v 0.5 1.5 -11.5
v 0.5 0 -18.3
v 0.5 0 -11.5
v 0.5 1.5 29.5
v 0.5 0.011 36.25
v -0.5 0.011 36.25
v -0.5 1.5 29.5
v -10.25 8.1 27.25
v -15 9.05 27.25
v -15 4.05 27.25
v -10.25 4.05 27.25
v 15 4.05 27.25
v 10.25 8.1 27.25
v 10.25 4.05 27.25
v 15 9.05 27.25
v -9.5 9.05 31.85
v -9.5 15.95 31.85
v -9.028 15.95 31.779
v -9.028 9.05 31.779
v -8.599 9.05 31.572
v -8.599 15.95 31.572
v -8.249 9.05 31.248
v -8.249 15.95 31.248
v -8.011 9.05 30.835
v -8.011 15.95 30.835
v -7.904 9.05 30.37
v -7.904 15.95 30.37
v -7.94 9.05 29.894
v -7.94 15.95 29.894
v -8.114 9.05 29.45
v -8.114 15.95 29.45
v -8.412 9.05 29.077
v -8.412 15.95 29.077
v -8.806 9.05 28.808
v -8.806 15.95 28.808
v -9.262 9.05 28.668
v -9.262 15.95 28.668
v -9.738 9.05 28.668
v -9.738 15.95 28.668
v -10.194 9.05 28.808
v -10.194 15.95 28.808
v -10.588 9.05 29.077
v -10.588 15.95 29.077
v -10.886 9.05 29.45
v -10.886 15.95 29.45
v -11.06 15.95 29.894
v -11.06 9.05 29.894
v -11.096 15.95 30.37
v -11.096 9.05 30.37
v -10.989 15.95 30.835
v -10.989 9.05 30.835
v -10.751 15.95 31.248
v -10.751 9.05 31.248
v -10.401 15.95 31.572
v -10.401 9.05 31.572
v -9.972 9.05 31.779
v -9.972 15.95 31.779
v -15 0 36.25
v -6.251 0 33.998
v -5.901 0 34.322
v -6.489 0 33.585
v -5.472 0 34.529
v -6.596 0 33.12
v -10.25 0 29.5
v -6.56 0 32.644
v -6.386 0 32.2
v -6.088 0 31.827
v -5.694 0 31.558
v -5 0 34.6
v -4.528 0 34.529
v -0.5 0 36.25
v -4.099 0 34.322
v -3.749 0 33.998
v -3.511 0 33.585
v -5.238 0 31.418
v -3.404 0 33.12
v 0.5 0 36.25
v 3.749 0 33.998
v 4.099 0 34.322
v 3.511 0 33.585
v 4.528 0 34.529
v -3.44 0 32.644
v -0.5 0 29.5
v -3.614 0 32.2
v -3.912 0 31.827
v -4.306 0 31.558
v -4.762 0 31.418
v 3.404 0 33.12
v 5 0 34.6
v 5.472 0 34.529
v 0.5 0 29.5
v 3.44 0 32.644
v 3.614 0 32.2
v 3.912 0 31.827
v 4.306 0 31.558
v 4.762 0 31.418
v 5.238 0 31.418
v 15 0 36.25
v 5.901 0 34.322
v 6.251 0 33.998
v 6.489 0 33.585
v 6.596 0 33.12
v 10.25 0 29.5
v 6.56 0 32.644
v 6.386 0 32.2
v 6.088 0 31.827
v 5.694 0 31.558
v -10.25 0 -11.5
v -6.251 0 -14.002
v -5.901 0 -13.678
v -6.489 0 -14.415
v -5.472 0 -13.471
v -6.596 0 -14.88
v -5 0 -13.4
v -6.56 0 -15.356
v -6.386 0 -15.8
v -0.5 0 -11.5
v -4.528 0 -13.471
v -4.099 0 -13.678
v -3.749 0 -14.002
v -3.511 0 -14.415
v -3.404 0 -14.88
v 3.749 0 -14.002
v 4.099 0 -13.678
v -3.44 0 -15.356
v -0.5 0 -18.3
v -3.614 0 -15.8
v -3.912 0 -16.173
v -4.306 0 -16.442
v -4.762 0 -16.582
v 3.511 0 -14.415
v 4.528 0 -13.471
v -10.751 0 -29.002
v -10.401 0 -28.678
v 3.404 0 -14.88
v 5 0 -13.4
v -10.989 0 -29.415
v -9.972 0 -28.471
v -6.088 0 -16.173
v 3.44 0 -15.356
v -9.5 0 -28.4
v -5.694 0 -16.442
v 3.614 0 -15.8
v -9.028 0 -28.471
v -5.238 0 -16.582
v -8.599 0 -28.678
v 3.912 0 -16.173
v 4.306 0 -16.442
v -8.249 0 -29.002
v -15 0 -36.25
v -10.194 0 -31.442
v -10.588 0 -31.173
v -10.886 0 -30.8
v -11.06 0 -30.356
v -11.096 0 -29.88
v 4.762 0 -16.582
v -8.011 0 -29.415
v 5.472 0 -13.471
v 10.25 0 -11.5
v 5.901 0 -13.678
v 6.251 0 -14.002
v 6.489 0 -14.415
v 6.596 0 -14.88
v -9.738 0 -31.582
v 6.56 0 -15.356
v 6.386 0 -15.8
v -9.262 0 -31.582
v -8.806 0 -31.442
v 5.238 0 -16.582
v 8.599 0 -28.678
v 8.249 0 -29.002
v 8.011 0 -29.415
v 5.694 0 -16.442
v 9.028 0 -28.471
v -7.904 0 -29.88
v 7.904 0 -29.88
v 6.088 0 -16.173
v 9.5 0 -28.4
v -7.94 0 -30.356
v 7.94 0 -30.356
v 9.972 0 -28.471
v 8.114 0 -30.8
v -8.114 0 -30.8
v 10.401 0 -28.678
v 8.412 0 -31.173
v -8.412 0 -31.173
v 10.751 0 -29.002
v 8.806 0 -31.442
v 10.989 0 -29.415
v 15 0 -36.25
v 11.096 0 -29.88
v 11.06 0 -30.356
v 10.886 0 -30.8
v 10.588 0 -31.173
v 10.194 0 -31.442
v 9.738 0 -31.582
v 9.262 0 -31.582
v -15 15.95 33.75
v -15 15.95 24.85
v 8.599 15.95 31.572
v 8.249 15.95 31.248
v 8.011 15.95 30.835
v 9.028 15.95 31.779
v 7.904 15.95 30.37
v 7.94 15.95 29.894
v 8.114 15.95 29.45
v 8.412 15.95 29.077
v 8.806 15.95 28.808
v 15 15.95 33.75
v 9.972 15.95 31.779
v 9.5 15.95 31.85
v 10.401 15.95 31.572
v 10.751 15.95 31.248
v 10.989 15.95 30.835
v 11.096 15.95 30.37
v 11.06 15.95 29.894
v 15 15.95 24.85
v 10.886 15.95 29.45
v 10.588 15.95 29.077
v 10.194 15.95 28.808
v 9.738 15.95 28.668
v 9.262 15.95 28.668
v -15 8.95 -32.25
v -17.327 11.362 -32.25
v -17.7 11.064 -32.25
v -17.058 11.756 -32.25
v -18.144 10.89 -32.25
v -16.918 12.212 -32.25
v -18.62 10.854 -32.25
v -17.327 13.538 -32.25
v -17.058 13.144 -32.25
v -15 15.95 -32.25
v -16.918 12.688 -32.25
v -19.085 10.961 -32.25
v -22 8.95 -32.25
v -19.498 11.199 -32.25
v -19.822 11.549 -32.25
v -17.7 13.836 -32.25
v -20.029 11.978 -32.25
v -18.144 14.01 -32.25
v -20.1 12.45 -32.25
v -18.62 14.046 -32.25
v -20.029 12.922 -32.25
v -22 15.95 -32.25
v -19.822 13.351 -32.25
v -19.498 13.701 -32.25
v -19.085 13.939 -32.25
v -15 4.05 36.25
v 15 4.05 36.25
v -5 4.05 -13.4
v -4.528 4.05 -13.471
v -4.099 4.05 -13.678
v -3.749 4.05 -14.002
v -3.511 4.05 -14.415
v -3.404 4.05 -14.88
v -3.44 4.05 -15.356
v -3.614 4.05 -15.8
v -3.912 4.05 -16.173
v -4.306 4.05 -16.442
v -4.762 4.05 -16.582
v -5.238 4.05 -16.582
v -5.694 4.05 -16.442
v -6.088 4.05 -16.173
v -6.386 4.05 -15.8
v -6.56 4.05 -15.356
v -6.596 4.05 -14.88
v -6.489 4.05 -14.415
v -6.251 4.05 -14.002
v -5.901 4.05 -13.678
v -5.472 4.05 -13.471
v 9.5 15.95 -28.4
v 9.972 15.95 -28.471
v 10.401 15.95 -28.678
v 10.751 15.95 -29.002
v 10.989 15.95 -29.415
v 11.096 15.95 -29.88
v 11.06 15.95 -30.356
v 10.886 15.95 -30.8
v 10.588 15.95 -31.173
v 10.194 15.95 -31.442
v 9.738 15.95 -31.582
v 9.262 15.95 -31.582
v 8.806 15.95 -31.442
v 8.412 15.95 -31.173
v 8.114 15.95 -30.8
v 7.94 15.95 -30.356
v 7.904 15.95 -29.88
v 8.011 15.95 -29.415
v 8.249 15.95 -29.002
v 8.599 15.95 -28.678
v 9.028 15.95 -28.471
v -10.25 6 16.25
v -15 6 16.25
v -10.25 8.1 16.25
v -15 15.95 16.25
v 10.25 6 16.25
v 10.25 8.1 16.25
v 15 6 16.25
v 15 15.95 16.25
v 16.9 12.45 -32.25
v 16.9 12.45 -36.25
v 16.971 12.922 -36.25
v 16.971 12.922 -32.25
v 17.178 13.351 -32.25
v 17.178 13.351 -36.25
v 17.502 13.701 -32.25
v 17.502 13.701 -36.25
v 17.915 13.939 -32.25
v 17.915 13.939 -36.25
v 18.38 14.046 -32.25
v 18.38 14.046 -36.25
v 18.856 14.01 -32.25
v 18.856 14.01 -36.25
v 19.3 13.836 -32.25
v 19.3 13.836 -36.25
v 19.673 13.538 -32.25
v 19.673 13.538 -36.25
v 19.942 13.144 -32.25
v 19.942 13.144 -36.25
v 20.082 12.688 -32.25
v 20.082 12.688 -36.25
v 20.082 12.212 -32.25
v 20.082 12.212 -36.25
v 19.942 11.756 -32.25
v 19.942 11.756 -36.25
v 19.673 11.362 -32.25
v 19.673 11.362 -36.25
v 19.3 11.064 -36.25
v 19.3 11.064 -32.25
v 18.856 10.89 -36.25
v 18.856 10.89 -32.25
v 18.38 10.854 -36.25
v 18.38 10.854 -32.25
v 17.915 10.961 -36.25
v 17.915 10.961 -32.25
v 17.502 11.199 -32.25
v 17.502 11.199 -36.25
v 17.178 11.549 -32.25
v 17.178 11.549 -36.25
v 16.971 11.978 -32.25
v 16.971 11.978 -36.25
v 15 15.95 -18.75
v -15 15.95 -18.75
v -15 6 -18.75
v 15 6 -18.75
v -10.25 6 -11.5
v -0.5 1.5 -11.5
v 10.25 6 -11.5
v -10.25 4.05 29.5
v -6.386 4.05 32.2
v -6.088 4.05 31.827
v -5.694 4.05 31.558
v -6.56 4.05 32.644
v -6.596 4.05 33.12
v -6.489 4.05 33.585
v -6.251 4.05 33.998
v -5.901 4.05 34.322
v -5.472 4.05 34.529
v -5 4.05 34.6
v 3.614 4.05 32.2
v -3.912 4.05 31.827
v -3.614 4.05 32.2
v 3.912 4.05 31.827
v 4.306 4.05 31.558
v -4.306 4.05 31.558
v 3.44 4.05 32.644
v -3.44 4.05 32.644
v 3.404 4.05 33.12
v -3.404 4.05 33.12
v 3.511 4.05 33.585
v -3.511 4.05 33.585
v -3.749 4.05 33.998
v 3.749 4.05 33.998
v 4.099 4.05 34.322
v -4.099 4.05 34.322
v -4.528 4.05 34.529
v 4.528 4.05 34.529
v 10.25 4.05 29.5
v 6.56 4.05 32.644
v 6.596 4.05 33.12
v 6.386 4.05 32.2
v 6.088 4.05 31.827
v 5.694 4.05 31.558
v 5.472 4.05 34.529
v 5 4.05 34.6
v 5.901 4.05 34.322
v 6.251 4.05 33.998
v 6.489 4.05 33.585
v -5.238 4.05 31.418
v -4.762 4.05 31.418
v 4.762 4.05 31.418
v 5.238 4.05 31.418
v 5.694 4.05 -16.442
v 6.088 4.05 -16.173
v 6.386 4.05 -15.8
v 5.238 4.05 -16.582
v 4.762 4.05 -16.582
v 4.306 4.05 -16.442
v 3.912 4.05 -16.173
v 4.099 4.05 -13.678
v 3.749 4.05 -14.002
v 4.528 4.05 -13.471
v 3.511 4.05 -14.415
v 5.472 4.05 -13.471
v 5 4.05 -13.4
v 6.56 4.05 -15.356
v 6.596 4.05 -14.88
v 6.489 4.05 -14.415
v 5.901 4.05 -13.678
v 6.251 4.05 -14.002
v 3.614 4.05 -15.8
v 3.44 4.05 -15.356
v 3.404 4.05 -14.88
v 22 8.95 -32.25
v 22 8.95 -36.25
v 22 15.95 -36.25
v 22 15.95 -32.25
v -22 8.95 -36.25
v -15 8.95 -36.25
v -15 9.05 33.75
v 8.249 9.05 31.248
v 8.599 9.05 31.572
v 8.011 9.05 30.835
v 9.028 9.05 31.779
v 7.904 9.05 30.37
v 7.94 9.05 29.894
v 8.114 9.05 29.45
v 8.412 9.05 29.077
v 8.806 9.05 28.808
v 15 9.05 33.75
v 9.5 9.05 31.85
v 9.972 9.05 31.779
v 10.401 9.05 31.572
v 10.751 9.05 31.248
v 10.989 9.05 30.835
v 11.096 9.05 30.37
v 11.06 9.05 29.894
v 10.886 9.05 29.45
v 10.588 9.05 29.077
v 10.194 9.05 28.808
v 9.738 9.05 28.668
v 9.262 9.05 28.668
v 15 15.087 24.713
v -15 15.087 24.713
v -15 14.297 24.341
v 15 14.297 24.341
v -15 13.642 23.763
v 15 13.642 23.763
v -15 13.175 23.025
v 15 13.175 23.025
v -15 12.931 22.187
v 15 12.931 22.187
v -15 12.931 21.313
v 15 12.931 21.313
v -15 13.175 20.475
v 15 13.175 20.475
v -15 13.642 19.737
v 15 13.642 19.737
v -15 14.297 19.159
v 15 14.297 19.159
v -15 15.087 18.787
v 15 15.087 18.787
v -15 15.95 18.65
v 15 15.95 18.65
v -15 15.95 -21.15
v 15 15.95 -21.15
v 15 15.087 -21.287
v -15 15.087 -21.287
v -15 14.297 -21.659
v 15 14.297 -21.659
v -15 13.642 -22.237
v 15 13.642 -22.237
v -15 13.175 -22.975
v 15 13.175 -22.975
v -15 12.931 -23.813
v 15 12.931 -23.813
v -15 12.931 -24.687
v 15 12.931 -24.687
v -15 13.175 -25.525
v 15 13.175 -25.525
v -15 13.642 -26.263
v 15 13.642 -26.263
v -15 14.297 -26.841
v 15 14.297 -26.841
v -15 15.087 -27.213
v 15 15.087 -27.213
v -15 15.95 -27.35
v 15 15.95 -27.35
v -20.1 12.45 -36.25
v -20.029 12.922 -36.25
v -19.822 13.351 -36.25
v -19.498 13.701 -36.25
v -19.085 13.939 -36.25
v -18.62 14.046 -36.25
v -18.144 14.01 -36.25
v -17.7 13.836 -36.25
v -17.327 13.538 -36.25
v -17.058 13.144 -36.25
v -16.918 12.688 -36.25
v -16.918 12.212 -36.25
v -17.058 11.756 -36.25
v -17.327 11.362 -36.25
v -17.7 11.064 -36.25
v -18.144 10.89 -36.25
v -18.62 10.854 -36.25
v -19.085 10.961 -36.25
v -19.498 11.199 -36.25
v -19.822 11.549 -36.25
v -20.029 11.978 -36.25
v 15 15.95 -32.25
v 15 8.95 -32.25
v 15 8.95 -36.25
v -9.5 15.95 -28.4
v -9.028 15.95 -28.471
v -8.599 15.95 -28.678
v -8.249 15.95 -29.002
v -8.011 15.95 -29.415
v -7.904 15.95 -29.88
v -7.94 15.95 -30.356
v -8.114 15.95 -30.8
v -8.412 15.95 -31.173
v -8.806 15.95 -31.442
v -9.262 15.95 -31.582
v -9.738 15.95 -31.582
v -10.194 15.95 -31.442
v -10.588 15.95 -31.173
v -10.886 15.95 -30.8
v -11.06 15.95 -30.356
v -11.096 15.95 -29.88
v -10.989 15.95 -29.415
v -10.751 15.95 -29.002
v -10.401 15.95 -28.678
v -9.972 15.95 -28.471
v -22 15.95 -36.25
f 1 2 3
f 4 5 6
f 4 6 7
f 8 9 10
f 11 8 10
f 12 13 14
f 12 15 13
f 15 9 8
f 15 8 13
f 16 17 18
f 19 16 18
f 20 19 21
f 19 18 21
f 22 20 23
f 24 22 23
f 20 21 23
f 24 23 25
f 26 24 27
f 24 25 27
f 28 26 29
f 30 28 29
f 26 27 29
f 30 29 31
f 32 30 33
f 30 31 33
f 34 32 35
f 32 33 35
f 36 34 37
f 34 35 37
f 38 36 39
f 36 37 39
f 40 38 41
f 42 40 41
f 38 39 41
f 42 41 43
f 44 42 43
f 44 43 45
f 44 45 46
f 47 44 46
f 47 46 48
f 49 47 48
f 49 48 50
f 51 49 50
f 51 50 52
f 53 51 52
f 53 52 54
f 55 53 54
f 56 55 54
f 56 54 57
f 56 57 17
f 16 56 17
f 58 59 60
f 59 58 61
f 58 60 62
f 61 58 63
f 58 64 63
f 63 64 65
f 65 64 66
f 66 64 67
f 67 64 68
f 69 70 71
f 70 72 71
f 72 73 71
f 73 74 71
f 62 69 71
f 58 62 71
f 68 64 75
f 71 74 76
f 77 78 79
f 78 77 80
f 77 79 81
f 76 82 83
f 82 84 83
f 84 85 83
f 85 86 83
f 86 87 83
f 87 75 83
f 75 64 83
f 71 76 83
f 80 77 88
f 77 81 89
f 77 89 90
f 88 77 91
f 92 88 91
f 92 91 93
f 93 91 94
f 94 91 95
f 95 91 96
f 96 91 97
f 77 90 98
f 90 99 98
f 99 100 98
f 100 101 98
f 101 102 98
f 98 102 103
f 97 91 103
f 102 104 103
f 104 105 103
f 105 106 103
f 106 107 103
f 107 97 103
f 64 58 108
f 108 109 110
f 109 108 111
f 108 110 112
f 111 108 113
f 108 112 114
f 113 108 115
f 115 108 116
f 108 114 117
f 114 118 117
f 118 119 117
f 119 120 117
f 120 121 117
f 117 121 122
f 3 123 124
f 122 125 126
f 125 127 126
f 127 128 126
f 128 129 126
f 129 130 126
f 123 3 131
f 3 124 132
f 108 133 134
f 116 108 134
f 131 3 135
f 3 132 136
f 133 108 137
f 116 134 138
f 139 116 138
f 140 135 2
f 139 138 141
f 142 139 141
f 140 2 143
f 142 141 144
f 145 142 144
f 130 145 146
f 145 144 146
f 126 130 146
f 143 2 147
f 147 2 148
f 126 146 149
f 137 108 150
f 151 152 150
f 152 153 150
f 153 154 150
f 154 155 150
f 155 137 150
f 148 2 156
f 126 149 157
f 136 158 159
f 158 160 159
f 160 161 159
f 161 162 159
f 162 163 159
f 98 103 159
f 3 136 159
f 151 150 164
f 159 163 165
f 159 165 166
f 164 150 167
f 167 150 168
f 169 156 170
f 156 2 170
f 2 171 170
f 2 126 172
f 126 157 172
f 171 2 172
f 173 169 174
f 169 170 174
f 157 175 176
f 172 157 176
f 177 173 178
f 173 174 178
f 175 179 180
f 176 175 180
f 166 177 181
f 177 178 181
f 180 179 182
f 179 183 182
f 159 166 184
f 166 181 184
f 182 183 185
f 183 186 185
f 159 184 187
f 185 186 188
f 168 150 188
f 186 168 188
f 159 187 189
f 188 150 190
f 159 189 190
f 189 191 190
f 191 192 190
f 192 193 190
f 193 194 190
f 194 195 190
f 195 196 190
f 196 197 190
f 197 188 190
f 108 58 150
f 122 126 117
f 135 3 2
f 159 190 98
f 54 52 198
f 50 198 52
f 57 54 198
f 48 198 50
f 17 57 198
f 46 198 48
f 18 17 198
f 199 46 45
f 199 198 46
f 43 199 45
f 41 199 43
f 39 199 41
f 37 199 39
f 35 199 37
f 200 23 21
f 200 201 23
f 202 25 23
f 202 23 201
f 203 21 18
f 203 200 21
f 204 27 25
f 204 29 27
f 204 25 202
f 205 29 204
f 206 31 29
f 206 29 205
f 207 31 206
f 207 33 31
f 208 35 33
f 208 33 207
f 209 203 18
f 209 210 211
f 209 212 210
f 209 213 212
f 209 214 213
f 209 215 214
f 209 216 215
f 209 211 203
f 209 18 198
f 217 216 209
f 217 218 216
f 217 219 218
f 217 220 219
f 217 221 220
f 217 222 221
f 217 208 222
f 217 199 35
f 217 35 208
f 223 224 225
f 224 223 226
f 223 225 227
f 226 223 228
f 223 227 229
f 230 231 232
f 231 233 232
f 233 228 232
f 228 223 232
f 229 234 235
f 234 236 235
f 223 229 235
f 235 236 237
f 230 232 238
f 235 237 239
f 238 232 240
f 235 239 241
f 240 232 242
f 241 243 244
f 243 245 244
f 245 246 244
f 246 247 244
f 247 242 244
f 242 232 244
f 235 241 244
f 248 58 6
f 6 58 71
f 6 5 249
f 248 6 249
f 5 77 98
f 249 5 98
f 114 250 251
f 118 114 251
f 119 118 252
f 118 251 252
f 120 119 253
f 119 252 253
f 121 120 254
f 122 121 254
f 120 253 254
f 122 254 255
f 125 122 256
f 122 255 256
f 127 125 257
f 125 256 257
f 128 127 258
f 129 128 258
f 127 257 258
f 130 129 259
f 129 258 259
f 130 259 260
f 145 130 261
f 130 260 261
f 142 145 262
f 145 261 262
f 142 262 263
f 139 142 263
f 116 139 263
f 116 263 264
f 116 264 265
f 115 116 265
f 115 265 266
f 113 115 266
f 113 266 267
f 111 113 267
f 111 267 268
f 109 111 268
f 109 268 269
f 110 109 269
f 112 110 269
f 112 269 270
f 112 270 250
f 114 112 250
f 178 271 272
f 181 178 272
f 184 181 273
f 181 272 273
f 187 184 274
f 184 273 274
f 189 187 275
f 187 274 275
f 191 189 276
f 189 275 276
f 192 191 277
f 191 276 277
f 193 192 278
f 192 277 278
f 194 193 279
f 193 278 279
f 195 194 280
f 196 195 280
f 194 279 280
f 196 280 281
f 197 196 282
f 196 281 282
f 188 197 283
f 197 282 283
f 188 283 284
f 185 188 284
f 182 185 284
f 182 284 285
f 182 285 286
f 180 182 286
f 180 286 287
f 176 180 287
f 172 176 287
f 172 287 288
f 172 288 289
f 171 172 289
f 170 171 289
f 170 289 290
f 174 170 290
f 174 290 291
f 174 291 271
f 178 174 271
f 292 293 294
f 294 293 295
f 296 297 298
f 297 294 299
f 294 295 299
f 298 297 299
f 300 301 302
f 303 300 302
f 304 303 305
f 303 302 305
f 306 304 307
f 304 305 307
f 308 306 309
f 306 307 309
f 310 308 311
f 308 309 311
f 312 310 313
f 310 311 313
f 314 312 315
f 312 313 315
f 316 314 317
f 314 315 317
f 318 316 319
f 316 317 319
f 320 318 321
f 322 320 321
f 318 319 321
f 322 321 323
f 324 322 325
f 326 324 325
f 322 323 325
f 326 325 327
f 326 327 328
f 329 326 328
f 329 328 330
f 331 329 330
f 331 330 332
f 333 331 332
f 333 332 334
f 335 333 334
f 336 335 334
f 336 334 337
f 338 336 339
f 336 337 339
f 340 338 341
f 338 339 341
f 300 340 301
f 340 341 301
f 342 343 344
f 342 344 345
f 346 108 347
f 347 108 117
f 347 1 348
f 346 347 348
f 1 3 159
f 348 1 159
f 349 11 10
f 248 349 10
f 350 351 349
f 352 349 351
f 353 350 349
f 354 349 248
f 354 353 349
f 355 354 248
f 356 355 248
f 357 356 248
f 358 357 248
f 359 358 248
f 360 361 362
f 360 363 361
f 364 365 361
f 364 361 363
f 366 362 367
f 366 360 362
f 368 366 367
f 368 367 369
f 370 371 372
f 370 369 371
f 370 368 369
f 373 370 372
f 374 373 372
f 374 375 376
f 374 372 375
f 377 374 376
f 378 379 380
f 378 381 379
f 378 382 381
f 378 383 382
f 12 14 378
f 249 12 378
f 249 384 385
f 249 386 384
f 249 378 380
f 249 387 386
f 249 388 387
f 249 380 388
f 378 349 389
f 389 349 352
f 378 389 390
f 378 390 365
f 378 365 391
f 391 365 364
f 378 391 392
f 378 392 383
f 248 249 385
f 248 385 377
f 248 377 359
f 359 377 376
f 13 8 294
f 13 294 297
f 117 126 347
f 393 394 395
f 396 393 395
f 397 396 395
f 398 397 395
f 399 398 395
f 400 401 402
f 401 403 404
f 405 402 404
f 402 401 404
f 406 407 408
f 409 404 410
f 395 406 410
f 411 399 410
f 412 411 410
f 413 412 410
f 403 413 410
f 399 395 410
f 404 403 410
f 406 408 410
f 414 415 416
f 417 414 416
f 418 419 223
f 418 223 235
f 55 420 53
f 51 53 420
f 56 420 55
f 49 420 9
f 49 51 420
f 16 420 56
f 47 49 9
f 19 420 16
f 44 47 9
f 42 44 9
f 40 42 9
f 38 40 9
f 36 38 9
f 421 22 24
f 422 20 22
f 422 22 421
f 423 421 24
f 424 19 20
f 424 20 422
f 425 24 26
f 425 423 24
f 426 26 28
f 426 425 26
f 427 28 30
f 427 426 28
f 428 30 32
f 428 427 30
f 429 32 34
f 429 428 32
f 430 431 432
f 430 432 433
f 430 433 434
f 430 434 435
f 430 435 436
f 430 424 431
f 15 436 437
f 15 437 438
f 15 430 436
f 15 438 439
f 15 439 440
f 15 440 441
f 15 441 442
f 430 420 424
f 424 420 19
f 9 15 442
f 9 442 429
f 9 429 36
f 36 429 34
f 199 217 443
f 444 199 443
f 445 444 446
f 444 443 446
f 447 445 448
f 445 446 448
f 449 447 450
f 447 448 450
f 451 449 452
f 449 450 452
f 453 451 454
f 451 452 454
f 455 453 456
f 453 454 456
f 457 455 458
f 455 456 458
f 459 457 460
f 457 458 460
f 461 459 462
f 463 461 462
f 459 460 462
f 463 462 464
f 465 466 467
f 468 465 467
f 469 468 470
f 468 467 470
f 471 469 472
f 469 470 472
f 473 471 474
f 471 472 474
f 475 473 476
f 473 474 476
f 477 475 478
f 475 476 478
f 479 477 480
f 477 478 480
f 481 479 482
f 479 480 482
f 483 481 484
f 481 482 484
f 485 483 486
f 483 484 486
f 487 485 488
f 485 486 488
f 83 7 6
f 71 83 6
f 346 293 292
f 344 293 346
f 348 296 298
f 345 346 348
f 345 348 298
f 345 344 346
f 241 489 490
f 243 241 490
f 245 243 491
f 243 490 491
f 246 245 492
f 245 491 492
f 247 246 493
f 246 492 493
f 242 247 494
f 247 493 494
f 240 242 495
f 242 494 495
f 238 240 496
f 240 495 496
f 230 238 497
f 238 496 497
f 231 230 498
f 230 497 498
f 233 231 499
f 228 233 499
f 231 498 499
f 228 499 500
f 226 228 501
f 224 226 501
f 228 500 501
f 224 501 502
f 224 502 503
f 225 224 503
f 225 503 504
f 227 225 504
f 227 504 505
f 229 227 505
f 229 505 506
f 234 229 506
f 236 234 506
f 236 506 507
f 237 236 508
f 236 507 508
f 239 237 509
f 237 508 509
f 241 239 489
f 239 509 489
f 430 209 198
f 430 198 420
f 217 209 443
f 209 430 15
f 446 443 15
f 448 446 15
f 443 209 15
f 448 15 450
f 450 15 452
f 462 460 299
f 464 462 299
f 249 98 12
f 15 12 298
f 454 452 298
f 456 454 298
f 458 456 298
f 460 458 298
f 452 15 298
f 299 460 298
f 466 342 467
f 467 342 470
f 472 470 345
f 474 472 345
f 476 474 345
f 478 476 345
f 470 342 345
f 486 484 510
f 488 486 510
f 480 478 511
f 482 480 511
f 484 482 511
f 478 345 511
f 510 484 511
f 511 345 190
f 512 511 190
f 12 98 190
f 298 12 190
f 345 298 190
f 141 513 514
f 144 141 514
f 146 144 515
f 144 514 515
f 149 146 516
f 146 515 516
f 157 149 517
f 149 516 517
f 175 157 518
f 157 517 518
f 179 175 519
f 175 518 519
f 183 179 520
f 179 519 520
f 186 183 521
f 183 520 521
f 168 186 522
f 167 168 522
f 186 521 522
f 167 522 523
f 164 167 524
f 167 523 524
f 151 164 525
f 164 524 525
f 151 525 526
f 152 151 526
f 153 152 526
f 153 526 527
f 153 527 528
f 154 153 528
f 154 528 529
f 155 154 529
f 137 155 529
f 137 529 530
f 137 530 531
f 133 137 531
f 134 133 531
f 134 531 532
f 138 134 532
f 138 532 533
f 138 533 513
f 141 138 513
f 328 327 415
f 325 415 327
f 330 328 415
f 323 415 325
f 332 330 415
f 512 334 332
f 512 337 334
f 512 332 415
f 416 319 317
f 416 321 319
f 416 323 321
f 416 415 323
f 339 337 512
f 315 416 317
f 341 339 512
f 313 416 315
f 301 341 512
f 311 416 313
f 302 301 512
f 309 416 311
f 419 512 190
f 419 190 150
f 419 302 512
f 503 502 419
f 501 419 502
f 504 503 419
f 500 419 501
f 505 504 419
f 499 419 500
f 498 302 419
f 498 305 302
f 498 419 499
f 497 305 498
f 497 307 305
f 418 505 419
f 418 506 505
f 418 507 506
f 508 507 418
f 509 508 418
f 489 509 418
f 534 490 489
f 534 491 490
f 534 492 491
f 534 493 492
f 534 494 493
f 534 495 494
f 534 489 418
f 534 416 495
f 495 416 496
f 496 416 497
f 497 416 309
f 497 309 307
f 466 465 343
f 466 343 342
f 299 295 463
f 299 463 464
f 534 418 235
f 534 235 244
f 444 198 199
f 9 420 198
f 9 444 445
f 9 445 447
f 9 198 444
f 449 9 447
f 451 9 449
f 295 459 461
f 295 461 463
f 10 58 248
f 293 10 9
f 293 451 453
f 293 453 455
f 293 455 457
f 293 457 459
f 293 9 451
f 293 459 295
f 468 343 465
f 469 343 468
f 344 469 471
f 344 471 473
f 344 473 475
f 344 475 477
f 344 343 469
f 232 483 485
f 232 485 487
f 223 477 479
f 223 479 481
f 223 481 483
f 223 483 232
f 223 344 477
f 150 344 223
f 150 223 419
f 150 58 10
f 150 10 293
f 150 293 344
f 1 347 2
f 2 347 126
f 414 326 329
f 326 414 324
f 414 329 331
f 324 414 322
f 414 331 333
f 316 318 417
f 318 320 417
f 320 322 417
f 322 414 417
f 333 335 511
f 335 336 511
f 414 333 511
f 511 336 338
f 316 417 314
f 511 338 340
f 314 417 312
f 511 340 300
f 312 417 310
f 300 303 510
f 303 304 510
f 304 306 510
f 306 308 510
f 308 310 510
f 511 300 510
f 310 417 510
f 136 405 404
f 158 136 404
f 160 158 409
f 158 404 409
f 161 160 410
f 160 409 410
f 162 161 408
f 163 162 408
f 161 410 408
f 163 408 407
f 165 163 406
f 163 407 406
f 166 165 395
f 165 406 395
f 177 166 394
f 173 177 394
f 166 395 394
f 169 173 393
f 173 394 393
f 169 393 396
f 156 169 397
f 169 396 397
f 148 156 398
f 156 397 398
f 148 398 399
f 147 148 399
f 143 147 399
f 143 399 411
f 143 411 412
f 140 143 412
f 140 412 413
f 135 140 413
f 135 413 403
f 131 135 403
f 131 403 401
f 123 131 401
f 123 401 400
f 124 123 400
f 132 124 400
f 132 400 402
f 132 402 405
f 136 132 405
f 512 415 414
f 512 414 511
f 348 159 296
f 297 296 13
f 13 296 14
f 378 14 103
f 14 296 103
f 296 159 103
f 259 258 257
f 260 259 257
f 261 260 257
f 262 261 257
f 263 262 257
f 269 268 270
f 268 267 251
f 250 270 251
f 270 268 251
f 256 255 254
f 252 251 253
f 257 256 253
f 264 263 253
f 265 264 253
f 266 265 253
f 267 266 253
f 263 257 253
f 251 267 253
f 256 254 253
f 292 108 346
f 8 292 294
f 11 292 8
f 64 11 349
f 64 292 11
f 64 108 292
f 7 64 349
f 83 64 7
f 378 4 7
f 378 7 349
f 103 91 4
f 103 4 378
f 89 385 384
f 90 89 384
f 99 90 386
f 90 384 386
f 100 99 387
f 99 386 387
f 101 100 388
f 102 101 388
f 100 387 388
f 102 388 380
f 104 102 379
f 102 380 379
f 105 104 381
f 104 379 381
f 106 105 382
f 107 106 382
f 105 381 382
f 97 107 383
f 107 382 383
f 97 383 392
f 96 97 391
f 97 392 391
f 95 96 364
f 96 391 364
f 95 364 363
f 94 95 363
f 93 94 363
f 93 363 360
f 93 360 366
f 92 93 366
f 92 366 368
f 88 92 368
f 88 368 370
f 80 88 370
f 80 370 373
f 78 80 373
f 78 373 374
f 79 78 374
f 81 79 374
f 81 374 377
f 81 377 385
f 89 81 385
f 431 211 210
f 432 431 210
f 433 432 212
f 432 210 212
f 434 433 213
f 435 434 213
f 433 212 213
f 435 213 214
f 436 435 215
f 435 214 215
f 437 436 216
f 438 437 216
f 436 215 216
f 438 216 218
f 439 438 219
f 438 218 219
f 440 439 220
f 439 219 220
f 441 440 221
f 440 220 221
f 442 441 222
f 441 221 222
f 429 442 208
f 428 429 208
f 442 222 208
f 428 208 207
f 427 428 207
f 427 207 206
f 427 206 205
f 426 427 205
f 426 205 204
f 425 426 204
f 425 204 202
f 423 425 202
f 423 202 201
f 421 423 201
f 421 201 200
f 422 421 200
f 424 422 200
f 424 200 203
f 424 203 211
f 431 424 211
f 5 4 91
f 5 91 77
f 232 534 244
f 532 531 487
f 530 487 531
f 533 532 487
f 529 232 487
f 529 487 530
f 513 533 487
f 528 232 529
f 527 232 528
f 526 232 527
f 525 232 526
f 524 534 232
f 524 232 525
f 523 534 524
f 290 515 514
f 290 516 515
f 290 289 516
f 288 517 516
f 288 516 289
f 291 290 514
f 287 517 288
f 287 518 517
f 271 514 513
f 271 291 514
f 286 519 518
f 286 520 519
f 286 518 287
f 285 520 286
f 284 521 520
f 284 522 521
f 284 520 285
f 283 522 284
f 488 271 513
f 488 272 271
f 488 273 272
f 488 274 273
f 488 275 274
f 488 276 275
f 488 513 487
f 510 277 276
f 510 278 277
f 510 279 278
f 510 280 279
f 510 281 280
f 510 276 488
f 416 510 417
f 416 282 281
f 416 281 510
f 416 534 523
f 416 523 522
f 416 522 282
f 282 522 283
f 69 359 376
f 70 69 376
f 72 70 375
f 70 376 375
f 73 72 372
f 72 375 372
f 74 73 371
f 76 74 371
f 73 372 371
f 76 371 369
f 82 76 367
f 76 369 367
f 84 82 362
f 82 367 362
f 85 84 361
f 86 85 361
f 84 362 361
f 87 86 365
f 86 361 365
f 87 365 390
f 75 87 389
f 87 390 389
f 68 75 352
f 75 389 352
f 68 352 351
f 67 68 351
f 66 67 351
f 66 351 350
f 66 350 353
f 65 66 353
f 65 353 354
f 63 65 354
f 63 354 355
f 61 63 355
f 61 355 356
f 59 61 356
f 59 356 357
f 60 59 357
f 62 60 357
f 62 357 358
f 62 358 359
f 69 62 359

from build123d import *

# Parameters (mm, degrees)
SKETCH3_W           = 30
SKETCH3_H           = 72.5
BOSS_EXTRUDE2_DEPTH = 15.95
SKETCH7_W           = 20.5
SKETCH7_H           = 41
CUT_EXTRUDE5_DEPTH  = 8.1
SKETCH8_W           = 30
SKETCH8_H           = 35
CUT_EXTRUDE6_DEPTH  = 9.95
CUT_EXTRUDE7_DEPTH  = 50.683649222
SKETCH10_R          = 3.1
CUT_EXTRUDE8_DEPTH  = 50.683649222
CUT_EXTRUDE9_REACH  = 44.349
SKETCH11_R          = 1.6
CUT_EXTRUDE10_REACH = 42.996
SKETCH12_R          = 1.6
SKETCH13_W          = 7
SKETCH13_H          = 7
SKETCH13_R          = 1.6
BOSS_EXTRUDE3_DEPTH = 4
CUT_EXTRUDE11_DEPTH = 0.5


with BuildPart() as part:
    # Sketch3 → Boss-Extrude2 (new body)
    with BuildSketch(Plane(origin=(0, 0, 0), x_dir=(1, 0, 0), z_dir=(0, 1, 0))):
        Rectangle(SKETCH3_W, SKETCH3_H)
    extrude(amount=BOSS_EXTRUDE2_DEPTH)

    # Sketch7 → Cut-Extrude5 (cut)
    with BuildSketch(Plane.XZ):
        with Locations((0, 9)):
            Rectangle(SKETCH7_W, SKETCH7_H)
    extrude(amount=-CUT_EXTRUDE5_DEPTH, mode=Mode.SUBTRACT)

    # Sketch8 → Cut-Extrude6 (cut)
    with BuildSketch(Plane(origin=(0, 15.95, 0), x_dir=(1, 0, 0), z_dir=(0, 1, 0))):
        with Locations((0, 1.25)):
            Rectangle(SKETCH8_W, SKETCH8_H)
    extrude(amount=-CUT_EXTRUDE6_DEPTH, mode=Mode.SUBTRACT)

    # Sketch9 → Cut-Extrude7 (cut, through all)
    with BuildSketch(Plane(origin=(15, 0, 0), x_dir=(0, 0, -1), z_dir=(1, 0, 0))):
        Polygon((-36.25, 15.95), (-33.75, 15.95), (-33.75, 9.05), (-27.25, 9.05), (-27.25, 4.05), (-36.25, 4.05), align=None)
    extrude(amount=-CUT_EXTRUDE7_DEPTH, mode=Mode.SUBTRACT)

    # Sketch10 → Cut-Extrude8 (cut, through all)
    with BuildSketch(Plane(origin=(15, 0, 0), x_dir=(0, 0, -1), z_dir=(1, 0, 0))):
        with Locations((24.25, 16)):
            Circle(SKETCH10_R)
        with Locations((-21.75, 16)):
            Circle(SKETCH10_R)
    extrude(amount=-CUT_EXTRUDE8_DEPTH, mode=Mode.SUBTRACT)

    # Sketch11 → Cut-Extrude9 (cut, up to next)
    with BuildSketch(Plane(origin=(0, 15.95, 0), x_dir=(1, 0, 0), z_dir=(0, 1, 0)), mode=Mode.PRIVATE) as cut_extrude9_sk1:
        with Locations(Location((-9.5, -30.25, 0), (0, 0, 270))):
            Circle(SKETCH11_R)
    cut_extrude9_tool1 = extrude(cut_extrude9_sk1.sketch, amount=-CUT_EXTRUDE9_REACH, mode=Mode.PRIVATE) & part.part
    # Sketch11 → Cut-Extrude9 (cut, up to next)
    with BuildSketch(Plane(origin=(0, 15.95, 0), x_dir=(1, 0, 0), z_dir=(0, 1, 0)), mode=Mode.PRIVATE) as cut_extrude9_sk2:
        with Locations(Location((9.5, -30.25, 0), (0, 0, 270))):
            Circle(SKETCH11_R)
    cut_extrude9_tool2 = extrude(cut_extrude9_sk2.sketch, amount=-CUT_EXTRUDE9_REACH, mode=Mode.PRIVATE) & part.part
    # Sketch11 → Cut-Extrude9 (cut, up to next)
    with BuildSketch(Plane(origin=(0, 15.95, 0), x_dir=(1, 0, 0), z_dir=(0, 1, 0)), mode=Mode.PRIVATE) as cut_extrude9_sk3:
        with Locations(Location((-9.5, 30, 0), (0, 0, 270))):
            Circle(SKETCH11_R)
    cut_extrude9_tool3 = extrude(cut_extrude9_sk3.sketch, amount=-CUT_EXTRUDE9_REACH, mode=Mode.PRIVATE) & part.part
    # Sketch11 → Cut-Extrude9 (cut, up to next)
    with BuildSketch(Plane(origin=(0, 15.95, 0), x_dir=(1, 0, 0), z_dir=(0, 1, 0)), mode=Mode.PRIVATE) as cut_extrude9_sk4:
        with Locations(Location((9.5, 30, 0), (0, 0, 270))):
            Circle(SKETCH11_R)
    cut_extrude9_tool4 = extrude(cut_extrude9_sk4.sketch, amount=-CUT_EXTRUDE9_REACH, mode=Mode.PRIVATE) & part.part
    add(cut_extrude9_tool1.solids().sort_by_distance((-9.5, 15.95, 30.25))[0], mode=Mode.SUBTRACT)
    add(cut_extrude9_tool2.solids().sort_by_distance((9.5, 15.95, 30.25))[0], mode=Mode.SUBTRACT)
    add(cut_extrude9_tool3.solids().sort_by_distance((-9.5, 15.95, -30))[0], mode=Mode.SUBTRACT)
    add(cut_extrude9_tool4.solids().sort_by_distance((9.5, 15.95, -30))[0], mode=Mode.SUBTRACT)

    # Sketch12 → Cut-Extrude10 (cut, up to next)
    with BuildSketch(Plane(origin=(0, 4.05, 0), x_dir=(1, 0, 0), z_dir=(0, 1, 0)), mode=Mode.PRIVATE) as cut_extrude10_sk1:
        with Locations(Location((-5, -33, 0), (0, 0, 270))):
            Circle(SKETCH12_R)
    cut_extrude10_tool1 = extrude(cut_extrude10_sk1.sketch, amount=-CUT_EXTRUDE10_REACH, mode=Mode.PRIVATE) & part.part
    # Sketch12 → Cut-Extrude10 (cut, up to next)
    with BuildSketch(Plane(origin=(0, 4.05, 0), x_dir=(1, 0, 0), z_dir=(0, 1, 0)), mode=Mode.PRIVATE) as cut_extrude10_sk2:
        with Locations(Location((5, -33, 0), (0, 0, 270))):
            Circle(SKETCH12_R)
    cut_extrude10_tool2 = extrude(cut_extrude10_sk2.sketch, amount=-CUT_EXTRUDE10_REACH, mode=Mode.PRIVATE) & part.part
    # Sketch12 → Cut-Extrude10 (cut, up to next)
    with BuildSketch(Plane(origin=(0, 4.05, 0), x_dir=(1, 0, 0), z_dir=(0, 1, 0)), mode=Mode.PRIVATE) as cut_extrude10_sk3:
        with Locations(Location((-5, 15, 0), (0, 0, 270))):
            Circle(SKETCH12_R)
    cut_extrude10_tool3 = extrude(cut_extrude10_sk3.sketch, amount=-CUT_EXTRUDE10_REACH, mode=Mode.PRIVATE) & part.part
    # Sketch12 → Cut-Extrude10 (cut, up to next)
    with BuildSketch(Plane(origin=(0, 4.05, 0), x_dir=(1, 0, 0), z_dir=(0, 1, 0)), mode=Mode.PRIVATE) as cut_extrude10_sk4:
        with Locations(Location((5, 15, 0), (0, 0, 270))):
            Circle(SKETCH12_R)
    cut_extrude10_tool4 = extrude(cut_extrude10_sk4.sketch, amount=-CUT_EXTRUDE10_REACH, mode=Mode.PRIVATE) & part.part
    add(cut_extrude10_tool1.solids().sort_by_distance((-5, 4.05, 33))[0], mode=Mode.SUBTRACT)
    add(cut_extrude10_tool2.solids().sort_by_distance((5, 4.05, 33))[0], mode=Mode.SUBTRACT)
    add(cut_extrude10_tool3.solids().sort_by_distance((-5, 4.05, -15))[0], mode=Mode.SUBTRACT)
    add(cut_extrude10_tool4.solids().sort_by_distance((5, 4.05, -15))[0], mode=Mode.SUBTRACT)

    # Sketch13 → Boss-Extrude3 (add)
    # profile 1 of 2: a face of its own
    with BuildSketch(Plane(origin=(0, 0, -36.25), x_dir=(-1, 0, 0), z_dir=(0, 0, -1))):
        with Locations((18.5, 12.45)):
            Rectangle(SKETCH13_W, SKETCH13_H)
        with Locations((18.5, 12.45)):
            Circle(SKETCH13_R, mode=Mode.SUBTRACT)
    # profile 2 of 2: a face of its own
    with BuildSketch(Plane(origin=(0, 0, -36.25), x_dir=(-1, 0, 0), z_dir=(0, 0, -1))):
        with Locations((-18.5, 12.45)):
            Rectangle(SKETCH13_W, SKETCH13_H)
        with Locations((-18.5, 12.45)):
            Circle(SKETCH13_R, mode=Mode.SUBTRACT)
    extrude(amount=-BOSS_EXTRUDE3_DEPTH)

    # Sketch14 → Cut-Extrude11 (cut, symmetric)
    with BuildSketch(Plane(origin=(0, 0, 0), x_dir=(0, 0, -1), z_dir=(1, 0, 0))):
        Polygon((18.3, 0), (11.5, 0), (11.5, 1.5), align=None)
        Polygon((-36.3, 0), (-29.5, 1.5), (-29.5, 0), align=None)
    extrude(amount=CUT_EXTRUDE11_DEPTH, both=True, mode=Mode.SUBTRACT)


solid = part.part
